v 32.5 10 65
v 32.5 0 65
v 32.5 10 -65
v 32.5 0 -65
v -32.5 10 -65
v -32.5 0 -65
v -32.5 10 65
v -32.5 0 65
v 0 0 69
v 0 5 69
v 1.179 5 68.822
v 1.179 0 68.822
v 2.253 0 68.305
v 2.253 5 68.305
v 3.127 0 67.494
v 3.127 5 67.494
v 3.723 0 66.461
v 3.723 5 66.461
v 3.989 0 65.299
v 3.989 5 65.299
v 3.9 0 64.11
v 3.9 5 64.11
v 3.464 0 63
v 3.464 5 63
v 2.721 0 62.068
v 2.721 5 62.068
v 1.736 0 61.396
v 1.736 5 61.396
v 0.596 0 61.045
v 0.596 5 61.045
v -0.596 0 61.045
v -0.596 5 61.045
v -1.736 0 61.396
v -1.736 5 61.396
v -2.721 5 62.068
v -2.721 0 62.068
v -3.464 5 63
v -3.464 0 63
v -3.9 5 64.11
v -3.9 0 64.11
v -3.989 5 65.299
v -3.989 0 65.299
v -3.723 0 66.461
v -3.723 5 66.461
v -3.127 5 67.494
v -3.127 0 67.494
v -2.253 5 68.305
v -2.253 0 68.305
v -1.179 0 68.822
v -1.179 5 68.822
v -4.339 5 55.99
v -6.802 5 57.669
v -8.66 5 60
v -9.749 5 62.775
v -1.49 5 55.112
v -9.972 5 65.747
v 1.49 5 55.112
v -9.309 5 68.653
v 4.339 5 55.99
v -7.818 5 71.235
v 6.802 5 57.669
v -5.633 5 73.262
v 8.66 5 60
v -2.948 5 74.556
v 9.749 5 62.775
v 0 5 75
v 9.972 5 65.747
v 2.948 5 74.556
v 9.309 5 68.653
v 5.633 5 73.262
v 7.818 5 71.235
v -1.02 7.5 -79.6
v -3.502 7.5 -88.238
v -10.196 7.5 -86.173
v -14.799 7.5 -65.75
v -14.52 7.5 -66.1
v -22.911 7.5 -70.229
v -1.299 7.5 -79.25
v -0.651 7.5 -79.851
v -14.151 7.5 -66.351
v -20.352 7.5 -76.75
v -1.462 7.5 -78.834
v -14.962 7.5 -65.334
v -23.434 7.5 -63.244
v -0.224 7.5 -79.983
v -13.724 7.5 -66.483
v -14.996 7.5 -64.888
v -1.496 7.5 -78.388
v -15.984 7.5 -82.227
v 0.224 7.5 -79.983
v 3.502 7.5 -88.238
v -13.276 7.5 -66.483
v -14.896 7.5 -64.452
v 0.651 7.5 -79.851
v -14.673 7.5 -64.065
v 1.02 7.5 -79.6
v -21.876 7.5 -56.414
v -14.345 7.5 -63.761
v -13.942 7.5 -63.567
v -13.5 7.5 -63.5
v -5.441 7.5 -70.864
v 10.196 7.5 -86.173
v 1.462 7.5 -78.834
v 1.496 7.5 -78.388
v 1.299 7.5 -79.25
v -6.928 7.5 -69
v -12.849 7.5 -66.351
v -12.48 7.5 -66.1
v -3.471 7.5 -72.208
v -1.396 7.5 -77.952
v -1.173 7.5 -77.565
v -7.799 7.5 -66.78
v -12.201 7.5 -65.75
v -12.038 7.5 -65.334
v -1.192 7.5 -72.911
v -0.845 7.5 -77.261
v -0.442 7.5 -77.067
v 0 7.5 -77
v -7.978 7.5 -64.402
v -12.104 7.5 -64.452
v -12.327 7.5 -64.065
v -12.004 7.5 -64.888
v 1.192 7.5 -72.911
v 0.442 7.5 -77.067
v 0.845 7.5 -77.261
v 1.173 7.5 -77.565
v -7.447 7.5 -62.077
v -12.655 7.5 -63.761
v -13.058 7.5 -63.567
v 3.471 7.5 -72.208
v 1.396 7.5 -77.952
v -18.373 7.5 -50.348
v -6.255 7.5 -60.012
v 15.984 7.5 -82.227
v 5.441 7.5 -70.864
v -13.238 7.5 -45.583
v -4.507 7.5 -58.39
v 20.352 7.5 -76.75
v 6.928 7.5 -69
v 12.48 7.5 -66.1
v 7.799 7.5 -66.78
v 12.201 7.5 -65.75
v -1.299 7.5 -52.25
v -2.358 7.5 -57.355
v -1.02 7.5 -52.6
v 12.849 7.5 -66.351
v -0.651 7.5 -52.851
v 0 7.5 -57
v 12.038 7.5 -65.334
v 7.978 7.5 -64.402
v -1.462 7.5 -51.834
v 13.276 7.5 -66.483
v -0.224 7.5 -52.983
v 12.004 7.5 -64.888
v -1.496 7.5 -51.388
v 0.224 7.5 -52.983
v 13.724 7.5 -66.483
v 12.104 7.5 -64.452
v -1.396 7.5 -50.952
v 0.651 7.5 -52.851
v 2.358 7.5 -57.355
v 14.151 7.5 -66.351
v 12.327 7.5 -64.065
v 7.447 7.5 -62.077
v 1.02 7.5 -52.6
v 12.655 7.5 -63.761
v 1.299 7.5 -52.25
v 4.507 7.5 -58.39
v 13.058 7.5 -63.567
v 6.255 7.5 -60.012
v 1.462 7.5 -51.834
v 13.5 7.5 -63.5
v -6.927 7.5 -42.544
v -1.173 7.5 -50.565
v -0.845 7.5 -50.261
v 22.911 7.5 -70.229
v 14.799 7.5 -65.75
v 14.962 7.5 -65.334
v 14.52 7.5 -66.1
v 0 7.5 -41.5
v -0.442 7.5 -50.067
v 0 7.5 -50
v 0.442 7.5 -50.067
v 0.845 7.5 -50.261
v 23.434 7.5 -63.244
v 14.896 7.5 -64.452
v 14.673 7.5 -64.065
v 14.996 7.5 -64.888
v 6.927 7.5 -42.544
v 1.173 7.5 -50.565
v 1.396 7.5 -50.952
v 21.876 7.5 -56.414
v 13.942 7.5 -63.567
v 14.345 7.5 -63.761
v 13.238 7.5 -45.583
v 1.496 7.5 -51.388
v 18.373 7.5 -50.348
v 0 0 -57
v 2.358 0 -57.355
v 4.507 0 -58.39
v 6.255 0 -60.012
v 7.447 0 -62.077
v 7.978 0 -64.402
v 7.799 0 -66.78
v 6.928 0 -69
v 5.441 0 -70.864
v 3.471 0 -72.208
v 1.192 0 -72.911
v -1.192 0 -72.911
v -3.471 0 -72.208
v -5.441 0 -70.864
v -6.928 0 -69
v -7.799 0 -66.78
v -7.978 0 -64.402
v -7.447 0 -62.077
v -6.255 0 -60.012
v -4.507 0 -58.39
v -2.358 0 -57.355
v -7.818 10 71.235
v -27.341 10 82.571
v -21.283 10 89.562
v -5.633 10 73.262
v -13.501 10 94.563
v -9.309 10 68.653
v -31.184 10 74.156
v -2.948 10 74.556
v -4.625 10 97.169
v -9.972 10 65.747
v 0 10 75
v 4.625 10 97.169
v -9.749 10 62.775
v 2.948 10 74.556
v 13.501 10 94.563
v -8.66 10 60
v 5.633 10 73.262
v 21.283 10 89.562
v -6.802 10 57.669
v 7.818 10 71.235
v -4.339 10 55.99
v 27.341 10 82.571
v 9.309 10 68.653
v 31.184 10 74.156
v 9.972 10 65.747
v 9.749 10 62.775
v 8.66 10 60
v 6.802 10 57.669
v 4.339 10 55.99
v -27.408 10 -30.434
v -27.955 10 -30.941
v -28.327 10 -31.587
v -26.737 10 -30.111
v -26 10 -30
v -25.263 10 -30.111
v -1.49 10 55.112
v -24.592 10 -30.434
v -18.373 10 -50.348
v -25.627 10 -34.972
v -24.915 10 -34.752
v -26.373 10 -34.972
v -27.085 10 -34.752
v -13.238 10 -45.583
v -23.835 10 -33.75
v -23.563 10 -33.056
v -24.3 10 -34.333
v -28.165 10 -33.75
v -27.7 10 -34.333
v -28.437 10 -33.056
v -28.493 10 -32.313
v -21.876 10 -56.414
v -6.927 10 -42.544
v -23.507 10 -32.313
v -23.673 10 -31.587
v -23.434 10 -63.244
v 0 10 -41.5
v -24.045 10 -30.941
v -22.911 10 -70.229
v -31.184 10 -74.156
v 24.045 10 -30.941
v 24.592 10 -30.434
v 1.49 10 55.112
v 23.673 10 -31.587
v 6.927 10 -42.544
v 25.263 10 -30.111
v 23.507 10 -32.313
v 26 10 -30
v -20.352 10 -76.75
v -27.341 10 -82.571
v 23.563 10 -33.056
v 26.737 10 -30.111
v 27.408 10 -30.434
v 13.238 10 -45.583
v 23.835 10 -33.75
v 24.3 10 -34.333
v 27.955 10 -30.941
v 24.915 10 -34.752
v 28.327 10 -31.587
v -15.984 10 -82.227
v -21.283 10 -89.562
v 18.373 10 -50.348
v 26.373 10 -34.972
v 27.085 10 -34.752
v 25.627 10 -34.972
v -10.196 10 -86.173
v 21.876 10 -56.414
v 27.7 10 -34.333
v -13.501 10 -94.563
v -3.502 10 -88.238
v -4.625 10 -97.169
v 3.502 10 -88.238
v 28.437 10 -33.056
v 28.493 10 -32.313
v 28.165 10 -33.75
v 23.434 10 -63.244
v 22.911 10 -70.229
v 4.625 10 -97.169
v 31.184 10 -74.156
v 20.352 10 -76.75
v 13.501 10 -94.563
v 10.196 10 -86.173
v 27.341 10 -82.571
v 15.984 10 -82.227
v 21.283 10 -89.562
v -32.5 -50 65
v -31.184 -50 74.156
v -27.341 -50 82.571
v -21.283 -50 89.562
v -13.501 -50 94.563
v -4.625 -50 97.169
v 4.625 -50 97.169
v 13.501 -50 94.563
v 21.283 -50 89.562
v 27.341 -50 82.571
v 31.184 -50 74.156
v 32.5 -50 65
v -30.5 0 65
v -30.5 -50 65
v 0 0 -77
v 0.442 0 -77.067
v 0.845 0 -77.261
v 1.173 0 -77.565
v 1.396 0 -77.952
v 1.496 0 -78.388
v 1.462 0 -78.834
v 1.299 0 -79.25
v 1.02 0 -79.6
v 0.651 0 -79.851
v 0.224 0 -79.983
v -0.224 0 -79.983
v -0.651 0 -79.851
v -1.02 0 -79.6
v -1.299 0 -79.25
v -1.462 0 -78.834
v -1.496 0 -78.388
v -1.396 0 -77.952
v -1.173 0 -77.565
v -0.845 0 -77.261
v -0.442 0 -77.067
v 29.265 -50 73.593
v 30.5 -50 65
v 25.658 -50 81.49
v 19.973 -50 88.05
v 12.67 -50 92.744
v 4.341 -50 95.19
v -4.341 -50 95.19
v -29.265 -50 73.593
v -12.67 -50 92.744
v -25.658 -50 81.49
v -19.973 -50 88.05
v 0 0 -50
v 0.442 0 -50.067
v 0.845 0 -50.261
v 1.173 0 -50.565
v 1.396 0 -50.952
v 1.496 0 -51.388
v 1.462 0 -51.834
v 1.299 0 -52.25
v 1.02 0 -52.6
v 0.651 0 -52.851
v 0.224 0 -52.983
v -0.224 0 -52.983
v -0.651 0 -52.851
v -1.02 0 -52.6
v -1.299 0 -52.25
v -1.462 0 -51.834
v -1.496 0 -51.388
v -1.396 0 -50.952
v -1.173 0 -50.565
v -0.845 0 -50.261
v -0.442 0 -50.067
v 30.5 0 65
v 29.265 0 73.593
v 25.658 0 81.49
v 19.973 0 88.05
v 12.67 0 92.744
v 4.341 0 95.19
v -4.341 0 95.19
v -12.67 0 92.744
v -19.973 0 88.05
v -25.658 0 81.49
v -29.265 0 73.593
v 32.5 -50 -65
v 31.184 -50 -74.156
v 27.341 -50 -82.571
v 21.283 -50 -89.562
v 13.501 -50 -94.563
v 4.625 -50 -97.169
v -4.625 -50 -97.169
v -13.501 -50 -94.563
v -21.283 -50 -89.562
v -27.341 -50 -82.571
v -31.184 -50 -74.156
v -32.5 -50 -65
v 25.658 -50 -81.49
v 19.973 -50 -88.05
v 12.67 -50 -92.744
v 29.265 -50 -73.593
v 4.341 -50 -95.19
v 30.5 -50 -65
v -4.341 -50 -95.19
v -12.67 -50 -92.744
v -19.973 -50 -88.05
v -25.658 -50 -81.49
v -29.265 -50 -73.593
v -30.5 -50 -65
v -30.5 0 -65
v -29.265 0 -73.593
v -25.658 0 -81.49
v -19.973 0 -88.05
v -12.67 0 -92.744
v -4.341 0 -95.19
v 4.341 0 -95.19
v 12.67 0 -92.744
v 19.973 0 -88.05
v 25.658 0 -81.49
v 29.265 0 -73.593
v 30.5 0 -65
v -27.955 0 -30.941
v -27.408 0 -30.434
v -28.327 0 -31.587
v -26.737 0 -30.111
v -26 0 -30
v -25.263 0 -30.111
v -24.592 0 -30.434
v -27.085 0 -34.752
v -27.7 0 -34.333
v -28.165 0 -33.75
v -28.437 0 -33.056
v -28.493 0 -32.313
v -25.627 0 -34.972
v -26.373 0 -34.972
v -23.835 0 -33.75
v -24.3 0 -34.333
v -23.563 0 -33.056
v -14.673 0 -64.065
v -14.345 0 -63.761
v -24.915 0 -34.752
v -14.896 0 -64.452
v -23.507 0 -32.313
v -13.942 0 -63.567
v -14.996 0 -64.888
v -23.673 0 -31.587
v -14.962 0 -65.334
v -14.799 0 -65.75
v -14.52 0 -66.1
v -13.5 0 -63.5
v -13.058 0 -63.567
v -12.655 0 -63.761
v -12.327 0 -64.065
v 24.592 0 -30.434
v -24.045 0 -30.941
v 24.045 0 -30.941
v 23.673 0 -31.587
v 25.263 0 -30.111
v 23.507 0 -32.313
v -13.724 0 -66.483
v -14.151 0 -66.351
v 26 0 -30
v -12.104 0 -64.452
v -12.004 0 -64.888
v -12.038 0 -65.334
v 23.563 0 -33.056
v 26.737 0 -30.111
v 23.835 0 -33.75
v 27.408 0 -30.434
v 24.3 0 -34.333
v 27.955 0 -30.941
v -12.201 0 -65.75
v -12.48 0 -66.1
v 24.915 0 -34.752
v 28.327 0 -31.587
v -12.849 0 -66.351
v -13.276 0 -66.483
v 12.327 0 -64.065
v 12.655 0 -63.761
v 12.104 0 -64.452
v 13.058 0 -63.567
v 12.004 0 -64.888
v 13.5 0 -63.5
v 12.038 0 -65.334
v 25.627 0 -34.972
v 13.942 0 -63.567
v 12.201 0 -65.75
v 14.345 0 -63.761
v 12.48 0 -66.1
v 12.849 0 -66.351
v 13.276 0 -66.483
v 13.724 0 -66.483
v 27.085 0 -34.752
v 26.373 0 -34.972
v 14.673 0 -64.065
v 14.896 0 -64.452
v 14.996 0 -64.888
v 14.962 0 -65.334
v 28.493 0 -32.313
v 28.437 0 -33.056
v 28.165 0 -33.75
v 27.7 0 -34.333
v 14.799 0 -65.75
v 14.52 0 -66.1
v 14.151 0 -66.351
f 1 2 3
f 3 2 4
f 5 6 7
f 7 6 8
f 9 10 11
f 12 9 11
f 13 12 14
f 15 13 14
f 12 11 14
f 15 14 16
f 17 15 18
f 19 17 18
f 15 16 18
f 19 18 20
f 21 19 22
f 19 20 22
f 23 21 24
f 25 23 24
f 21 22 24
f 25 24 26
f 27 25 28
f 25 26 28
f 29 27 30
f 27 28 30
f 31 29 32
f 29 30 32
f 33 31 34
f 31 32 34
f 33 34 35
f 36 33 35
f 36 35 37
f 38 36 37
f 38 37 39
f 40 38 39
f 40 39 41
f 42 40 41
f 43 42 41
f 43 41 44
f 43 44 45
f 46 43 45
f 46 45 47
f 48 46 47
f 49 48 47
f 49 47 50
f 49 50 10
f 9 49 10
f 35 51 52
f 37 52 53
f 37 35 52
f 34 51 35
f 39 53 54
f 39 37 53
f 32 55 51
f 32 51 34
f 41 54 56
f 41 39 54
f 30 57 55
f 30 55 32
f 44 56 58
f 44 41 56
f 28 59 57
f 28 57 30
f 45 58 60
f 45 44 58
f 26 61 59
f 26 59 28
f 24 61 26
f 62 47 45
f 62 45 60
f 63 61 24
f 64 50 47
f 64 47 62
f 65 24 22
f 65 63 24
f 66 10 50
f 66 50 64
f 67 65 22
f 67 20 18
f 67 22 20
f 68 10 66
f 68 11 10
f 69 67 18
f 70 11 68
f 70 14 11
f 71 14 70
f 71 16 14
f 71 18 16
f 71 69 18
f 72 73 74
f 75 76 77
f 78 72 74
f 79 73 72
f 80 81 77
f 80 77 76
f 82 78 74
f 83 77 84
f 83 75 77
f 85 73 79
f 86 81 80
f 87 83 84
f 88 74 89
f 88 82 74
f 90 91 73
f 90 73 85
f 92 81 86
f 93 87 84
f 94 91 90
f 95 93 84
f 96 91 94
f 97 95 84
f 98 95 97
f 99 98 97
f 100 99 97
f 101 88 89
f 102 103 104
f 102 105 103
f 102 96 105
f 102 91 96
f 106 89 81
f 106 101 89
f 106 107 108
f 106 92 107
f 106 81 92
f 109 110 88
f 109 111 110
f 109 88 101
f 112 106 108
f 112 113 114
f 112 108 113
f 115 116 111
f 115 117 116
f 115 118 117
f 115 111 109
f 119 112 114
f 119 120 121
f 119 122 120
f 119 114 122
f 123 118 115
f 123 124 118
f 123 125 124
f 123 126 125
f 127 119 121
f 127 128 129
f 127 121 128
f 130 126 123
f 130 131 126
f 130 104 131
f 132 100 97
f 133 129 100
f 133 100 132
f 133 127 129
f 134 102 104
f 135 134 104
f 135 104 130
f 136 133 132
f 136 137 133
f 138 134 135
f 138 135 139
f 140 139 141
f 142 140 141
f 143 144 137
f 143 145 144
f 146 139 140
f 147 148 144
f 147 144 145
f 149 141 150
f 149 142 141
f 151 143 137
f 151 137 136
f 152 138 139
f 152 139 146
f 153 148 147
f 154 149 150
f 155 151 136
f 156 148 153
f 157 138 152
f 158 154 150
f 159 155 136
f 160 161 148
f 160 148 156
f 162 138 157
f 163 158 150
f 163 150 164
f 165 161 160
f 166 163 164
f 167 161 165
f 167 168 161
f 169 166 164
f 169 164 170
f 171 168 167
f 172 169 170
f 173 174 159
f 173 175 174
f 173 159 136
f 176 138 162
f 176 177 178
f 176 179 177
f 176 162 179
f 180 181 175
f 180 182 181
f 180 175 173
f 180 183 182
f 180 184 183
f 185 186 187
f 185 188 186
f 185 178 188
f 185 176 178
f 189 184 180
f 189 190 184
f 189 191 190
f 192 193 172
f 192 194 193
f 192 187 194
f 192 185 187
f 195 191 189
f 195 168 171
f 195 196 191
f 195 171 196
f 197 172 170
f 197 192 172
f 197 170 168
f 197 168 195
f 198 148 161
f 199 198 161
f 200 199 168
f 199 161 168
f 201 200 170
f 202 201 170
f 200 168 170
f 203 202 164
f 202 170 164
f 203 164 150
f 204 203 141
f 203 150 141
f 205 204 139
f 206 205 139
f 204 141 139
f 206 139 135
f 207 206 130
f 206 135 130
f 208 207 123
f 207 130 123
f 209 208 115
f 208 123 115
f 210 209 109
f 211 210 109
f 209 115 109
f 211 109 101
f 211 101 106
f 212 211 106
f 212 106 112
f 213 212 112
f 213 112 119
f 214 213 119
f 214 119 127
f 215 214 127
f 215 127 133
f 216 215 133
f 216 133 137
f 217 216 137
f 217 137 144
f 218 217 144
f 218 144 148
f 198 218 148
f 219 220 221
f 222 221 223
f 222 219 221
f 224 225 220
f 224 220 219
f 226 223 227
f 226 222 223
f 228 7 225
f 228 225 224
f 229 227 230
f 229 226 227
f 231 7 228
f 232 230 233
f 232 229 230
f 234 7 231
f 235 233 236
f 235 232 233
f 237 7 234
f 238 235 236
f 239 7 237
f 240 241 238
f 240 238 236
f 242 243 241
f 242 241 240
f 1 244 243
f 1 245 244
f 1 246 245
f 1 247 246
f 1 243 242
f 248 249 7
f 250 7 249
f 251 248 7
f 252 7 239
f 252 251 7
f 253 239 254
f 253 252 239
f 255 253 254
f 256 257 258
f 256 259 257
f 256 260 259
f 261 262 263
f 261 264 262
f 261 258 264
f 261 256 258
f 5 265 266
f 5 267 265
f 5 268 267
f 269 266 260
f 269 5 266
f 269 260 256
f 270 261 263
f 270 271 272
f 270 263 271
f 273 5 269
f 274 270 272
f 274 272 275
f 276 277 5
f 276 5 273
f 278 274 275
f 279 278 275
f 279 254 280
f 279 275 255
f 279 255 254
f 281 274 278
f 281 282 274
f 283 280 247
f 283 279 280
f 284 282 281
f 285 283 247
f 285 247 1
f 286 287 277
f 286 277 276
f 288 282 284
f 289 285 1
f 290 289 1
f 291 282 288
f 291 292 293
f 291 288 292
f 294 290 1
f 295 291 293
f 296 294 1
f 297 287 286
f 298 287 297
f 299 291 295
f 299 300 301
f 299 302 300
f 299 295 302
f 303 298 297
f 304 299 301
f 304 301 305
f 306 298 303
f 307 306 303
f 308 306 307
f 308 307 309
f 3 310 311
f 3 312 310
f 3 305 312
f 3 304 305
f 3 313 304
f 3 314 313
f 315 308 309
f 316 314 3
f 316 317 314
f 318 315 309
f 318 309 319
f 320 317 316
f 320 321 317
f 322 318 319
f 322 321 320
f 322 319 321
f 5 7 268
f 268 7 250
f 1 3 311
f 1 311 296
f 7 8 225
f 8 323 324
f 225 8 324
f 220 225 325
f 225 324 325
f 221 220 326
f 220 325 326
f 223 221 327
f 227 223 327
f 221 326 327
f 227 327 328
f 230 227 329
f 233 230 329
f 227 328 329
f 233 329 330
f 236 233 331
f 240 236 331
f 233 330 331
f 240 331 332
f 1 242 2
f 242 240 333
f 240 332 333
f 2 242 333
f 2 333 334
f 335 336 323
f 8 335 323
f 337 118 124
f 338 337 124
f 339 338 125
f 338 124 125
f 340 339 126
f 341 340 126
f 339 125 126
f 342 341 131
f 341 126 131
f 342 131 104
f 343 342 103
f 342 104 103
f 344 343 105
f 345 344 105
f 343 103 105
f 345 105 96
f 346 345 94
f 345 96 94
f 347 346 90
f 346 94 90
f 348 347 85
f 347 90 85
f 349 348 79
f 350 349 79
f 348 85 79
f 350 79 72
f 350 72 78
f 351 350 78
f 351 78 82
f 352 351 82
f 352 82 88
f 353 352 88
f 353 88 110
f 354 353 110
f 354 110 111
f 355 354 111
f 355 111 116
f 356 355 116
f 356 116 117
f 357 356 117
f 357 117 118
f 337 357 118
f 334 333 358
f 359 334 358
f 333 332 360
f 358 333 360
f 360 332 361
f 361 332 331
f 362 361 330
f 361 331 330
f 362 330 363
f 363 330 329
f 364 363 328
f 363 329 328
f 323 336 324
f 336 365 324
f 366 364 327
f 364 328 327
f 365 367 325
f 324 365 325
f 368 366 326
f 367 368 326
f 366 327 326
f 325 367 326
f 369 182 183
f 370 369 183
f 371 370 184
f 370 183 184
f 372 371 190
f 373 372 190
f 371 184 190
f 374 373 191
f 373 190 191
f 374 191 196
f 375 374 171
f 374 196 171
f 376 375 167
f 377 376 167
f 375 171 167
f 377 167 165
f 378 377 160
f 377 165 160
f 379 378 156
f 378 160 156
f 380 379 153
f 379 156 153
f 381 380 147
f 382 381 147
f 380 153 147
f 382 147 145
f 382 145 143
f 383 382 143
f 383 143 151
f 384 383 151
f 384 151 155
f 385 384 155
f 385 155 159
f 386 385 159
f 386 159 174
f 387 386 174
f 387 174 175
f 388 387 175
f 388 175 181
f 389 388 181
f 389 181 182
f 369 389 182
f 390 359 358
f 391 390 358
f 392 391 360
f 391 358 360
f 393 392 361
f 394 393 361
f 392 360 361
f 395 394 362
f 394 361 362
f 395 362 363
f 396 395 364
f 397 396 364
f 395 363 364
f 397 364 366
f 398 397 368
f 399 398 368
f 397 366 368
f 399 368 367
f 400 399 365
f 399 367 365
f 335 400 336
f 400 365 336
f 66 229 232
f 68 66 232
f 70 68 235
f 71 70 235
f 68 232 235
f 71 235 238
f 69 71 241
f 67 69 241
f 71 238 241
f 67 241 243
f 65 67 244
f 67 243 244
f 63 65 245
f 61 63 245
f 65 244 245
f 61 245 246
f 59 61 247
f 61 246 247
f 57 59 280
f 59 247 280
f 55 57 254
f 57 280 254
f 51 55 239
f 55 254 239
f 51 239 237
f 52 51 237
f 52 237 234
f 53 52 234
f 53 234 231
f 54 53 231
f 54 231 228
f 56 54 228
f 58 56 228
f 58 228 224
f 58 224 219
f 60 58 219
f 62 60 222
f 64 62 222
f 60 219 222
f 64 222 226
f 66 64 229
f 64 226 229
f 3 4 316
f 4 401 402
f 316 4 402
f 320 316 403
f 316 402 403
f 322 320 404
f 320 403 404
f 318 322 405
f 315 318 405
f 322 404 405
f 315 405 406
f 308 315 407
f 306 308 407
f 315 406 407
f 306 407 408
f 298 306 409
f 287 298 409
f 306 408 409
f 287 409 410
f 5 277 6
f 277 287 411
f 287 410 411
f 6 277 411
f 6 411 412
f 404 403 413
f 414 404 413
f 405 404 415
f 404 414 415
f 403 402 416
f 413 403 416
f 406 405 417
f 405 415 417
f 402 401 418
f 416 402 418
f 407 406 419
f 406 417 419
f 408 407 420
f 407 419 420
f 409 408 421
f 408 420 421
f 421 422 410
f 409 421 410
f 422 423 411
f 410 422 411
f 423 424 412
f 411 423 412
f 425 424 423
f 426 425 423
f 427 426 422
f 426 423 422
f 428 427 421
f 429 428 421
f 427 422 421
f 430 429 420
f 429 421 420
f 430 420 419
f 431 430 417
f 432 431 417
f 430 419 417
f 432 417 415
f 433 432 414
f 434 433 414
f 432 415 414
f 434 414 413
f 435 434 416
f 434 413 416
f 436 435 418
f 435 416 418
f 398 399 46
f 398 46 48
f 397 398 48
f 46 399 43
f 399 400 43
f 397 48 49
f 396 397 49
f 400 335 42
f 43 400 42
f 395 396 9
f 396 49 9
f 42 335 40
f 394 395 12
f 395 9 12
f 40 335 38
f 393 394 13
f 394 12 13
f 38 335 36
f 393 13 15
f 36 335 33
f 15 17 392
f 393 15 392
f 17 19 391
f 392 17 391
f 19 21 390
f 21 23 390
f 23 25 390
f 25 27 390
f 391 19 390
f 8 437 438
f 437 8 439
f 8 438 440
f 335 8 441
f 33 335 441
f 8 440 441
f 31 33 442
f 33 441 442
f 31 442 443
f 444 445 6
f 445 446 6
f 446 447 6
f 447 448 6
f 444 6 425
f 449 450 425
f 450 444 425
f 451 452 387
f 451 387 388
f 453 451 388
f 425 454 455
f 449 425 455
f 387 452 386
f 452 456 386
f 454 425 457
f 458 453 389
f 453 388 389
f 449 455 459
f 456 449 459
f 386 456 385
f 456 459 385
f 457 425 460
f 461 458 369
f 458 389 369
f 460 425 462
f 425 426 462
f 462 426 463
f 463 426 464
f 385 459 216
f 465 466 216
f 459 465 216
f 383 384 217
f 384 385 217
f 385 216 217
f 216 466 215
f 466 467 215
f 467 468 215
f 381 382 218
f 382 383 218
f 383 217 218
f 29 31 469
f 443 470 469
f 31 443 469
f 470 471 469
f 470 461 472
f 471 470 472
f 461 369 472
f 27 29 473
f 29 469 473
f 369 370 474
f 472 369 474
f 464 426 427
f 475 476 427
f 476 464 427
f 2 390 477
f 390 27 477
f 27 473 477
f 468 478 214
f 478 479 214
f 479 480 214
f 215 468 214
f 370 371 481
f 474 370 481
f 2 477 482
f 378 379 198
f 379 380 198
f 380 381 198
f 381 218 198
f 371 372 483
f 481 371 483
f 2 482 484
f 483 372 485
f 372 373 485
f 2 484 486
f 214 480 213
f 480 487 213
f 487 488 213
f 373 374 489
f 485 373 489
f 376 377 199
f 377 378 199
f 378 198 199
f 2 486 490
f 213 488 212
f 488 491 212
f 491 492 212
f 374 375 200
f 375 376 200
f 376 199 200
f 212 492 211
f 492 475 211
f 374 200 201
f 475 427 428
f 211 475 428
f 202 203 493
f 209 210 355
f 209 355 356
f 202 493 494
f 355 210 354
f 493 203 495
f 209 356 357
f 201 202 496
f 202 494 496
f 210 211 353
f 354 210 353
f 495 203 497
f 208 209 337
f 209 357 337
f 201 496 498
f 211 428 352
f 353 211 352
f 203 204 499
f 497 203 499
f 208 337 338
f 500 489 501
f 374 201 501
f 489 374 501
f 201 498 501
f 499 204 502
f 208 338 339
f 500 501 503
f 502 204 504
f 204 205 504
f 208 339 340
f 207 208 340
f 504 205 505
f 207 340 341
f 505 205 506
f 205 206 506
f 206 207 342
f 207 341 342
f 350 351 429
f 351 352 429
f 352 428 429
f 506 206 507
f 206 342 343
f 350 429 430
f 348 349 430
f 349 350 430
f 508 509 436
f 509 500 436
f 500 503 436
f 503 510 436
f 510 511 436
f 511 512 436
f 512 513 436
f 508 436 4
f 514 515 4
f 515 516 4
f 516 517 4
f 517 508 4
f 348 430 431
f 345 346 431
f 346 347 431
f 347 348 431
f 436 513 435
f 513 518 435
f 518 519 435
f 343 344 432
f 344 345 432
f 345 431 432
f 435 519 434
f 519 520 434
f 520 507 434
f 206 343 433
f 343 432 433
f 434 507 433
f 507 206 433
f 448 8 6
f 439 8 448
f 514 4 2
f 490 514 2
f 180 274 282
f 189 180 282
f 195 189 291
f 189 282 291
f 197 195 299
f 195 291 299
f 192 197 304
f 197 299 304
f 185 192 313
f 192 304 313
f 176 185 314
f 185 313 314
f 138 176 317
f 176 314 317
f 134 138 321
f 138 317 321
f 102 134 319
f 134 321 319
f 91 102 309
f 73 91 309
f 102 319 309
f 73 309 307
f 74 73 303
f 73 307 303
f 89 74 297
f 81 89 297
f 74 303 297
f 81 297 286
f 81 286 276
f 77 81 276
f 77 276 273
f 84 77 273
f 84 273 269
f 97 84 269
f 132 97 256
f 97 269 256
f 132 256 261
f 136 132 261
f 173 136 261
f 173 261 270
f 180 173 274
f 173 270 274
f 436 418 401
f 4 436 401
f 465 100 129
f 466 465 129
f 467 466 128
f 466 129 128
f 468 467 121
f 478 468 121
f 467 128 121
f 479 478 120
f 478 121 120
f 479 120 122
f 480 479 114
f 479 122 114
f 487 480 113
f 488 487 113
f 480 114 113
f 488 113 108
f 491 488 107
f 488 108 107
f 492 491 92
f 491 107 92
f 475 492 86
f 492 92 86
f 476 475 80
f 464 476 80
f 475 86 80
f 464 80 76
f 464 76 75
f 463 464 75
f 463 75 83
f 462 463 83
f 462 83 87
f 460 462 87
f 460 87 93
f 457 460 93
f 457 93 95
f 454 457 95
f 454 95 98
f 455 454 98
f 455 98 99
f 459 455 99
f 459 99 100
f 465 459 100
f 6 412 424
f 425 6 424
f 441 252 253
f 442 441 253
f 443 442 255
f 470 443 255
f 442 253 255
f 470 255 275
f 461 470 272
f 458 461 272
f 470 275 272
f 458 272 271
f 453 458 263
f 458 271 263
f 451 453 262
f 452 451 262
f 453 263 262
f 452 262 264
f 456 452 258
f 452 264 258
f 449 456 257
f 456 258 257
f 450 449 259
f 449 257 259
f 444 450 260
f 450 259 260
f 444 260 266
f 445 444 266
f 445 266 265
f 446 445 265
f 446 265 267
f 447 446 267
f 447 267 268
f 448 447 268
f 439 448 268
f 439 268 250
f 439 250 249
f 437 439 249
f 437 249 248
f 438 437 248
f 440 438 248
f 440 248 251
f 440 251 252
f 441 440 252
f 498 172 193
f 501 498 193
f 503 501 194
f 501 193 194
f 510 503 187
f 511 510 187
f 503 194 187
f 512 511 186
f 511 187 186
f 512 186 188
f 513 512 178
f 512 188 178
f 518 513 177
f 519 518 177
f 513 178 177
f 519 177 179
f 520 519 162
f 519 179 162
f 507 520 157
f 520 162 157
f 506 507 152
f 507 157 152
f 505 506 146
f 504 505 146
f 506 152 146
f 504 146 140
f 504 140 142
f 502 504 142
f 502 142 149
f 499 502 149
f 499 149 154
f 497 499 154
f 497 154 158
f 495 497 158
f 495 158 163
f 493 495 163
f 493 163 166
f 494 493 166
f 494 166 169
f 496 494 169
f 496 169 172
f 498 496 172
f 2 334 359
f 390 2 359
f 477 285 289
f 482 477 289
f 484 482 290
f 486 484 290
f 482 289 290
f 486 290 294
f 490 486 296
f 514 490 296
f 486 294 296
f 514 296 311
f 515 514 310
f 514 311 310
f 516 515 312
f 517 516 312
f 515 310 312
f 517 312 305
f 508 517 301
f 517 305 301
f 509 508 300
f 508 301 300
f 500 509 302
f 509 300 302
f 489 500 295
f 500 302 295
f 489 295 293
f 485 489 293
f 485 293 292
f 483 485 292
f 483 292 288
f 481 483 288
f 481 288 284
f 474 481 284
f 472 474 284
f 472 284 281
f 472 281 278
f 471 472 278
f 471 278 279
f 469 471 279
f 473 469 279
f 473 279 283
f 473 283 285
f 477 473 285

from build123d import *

# Parameters (mm, degrees)
BOSS_EXTRUDE1_DEPTH = 10
SKETCH2_R           = 23.5
CUT_EXTRUDE1_DEPTH  = 2.5
SKETCH4_R           = 8
CUT_EXTRUDE3_DEPTH  = 104.047319228
BOSS_EXTRUDE3_START = 50
BOSS_EXTRUDE3_DEPTH = 50
SKETCH8_R           = 1.5
CUT_EXTRUDE4_DEPTH  = 10
SKETCH9_R           = 4
CUT_EXTRUDE5_DEPTH  = 120.006302354
SKETCH10_R          = 10
CUT_EXTRUDE6_DEPTH  = 5
SKETCH11_R          = 2.5
CUT_EXTRUDE7_DEPTH  = 120.006302354


with BuildPart() as part:
    # Sketch1 → Boss-Extrude1 (new body)
    with BuildSketch(Plane(origin=(0, 0, 0), x_dir=(1, 0, 0), z_dir=(0, 1, 0))):
        with BuildLine():
            Line((-32.5, 65), (-32.5, -65))
            ThreePointArc((-32.5, -65), (0, -97.5), (32.5, -65))
            Line((32.5, -65), (32.5, 65))
            ThreePointArc((32.5, 65), (0, 97.5), (-32.5, 65))
        make_face()
    extrude(amount=BOSS_EXTRUDE1_DEPTH)

    # Sketch2 → Cut-Extrude1 (cut)
    with BuildSketch(Plane(origin=(0, 10, 0), x_dir=(1, 0, 0), z_dir=(0, 1, 0))):
        with Locations(Location((0, 65, 0), (0, 0, 270))):
            Circle(SKETCH2_R)
    extrude(amount=-CUT_EXTRUDE1_DEPTH, mode=Mode.SUBTRACT)

    # Sketch4 → Cut-Extrude3 (cut, through all)
    with BuildSketch(Plane(origin=(0, 7.5, 0), x_dir=(1, 0, 0), z_dir=(0, 1, 0))):
        with Locations(Location((0, 65, 0), (0, 0, 270))):
            Circle(SKETCH4_R)
    extrude(amount=-CUT_EXTRUDE3_DEPTH, mode=Mode.SUBTRACT)

    # Sketch7 → Boss-Extrude3 (add)
    with BuildSketch(Plane.XZ.offset(BOSS_EXTRUDE3_START)):
        with BuildLine():
            Line((-30.5, 65), (-32.5, 65))
            ThreePointArc((-32.5, 65), (0, 97.5), (32.5, 65))
            Line((32.5, 65), (30.5, 65))
            ThreePointArc((30.5, 65), (0, 95.5), (-30.5, 65))
        make_face()
        with BuildLine():
            Line((-32.5, -65), (-30.5, -65))
            ThreePointArc((-30.5, -65), (0, -95.5), (30.5, -65))
            Line((30.5, -65), (32.5, -65))
            ThreePointArc((32.5, -65), (0, -97.5), (-32.5, -65))
        make_face()
    extrude(amount=-BOSS_EXTRUDE3_DEPTH)

    # Sketch8 → Cut-Extrude4 (cut)
    with BuildSketch(Plane(origin=(0, 7.5, 0), x_dir=(1, 0, 0), z_dir=(0, 1, 0))):
        with Locations(Location((13.5, 65, 0), (0, 0, 270))):
            Circle(SKETCH8_R)
        with Locations(Location((0, 78.5, 0), (0, 0, 270))):
            Circle(SKETCH8_R)
        with Locations(Location((-13.5, 65, 0), (0, 0, 270))):
            Circle(SKETCH8_R)
        with Locations(Location((0, 51.5, 0), (0, 0, 270))):
            Circle(SKETCH8_R)
    extrude(amount=-CUT_EXTRUDE4_DEPTH, mode=Mode.SUBTRACT)

    # Sketch9 → Cut-Extrude5 (cut, through all)
    with BuildSketch(Plane(origin=(0, 10, 0), x_dir=(1, 0, 0), z_dir=(0, 1, 0))):
        with Locations(Location((0, -65, 0), (0, 0, 270))):
            Circle(SKETCH9_R)
    extrude(amount=-CUT_EXTRUDE5_DEPTH, mode=Mode.SUBTRACT)

    # Sketch10 → Cut-Extrude6 (cut)
    with BuildSketch(Plane(origin=(0, 10, 0), x_dir=(1, 0, 0), z_dir=(0, 1, 0))):
        with Locations(Location((0, -65, 0), (0, 0, 270))):
            Circle(SKETCH10_R)
    extrude(amount=-CUT_EXTRUDE6_DEPTH, mode=Mode.SUBTRACT)

    # Sketch11 → Cut-Extrude7 (cut, through all)
    with BuildSketch(Plane(origin=(0, 10, 0), x_dir=(1, 0, 0), z_dir=(0, 1, 0))):
        with Locations(Location((-26, 32.5, 0), (0, 0, 270))):
            Circle(SKETCH11_R)
        with Locations(Location((26, 32.5, 0), (0, 0, 270))):
            Circle(SKETCH11_R)
    extrude(amount=-CUT_EXTRUDE7_DEPTH, mode=Mode.SUBTRACT)


solid = part.part
